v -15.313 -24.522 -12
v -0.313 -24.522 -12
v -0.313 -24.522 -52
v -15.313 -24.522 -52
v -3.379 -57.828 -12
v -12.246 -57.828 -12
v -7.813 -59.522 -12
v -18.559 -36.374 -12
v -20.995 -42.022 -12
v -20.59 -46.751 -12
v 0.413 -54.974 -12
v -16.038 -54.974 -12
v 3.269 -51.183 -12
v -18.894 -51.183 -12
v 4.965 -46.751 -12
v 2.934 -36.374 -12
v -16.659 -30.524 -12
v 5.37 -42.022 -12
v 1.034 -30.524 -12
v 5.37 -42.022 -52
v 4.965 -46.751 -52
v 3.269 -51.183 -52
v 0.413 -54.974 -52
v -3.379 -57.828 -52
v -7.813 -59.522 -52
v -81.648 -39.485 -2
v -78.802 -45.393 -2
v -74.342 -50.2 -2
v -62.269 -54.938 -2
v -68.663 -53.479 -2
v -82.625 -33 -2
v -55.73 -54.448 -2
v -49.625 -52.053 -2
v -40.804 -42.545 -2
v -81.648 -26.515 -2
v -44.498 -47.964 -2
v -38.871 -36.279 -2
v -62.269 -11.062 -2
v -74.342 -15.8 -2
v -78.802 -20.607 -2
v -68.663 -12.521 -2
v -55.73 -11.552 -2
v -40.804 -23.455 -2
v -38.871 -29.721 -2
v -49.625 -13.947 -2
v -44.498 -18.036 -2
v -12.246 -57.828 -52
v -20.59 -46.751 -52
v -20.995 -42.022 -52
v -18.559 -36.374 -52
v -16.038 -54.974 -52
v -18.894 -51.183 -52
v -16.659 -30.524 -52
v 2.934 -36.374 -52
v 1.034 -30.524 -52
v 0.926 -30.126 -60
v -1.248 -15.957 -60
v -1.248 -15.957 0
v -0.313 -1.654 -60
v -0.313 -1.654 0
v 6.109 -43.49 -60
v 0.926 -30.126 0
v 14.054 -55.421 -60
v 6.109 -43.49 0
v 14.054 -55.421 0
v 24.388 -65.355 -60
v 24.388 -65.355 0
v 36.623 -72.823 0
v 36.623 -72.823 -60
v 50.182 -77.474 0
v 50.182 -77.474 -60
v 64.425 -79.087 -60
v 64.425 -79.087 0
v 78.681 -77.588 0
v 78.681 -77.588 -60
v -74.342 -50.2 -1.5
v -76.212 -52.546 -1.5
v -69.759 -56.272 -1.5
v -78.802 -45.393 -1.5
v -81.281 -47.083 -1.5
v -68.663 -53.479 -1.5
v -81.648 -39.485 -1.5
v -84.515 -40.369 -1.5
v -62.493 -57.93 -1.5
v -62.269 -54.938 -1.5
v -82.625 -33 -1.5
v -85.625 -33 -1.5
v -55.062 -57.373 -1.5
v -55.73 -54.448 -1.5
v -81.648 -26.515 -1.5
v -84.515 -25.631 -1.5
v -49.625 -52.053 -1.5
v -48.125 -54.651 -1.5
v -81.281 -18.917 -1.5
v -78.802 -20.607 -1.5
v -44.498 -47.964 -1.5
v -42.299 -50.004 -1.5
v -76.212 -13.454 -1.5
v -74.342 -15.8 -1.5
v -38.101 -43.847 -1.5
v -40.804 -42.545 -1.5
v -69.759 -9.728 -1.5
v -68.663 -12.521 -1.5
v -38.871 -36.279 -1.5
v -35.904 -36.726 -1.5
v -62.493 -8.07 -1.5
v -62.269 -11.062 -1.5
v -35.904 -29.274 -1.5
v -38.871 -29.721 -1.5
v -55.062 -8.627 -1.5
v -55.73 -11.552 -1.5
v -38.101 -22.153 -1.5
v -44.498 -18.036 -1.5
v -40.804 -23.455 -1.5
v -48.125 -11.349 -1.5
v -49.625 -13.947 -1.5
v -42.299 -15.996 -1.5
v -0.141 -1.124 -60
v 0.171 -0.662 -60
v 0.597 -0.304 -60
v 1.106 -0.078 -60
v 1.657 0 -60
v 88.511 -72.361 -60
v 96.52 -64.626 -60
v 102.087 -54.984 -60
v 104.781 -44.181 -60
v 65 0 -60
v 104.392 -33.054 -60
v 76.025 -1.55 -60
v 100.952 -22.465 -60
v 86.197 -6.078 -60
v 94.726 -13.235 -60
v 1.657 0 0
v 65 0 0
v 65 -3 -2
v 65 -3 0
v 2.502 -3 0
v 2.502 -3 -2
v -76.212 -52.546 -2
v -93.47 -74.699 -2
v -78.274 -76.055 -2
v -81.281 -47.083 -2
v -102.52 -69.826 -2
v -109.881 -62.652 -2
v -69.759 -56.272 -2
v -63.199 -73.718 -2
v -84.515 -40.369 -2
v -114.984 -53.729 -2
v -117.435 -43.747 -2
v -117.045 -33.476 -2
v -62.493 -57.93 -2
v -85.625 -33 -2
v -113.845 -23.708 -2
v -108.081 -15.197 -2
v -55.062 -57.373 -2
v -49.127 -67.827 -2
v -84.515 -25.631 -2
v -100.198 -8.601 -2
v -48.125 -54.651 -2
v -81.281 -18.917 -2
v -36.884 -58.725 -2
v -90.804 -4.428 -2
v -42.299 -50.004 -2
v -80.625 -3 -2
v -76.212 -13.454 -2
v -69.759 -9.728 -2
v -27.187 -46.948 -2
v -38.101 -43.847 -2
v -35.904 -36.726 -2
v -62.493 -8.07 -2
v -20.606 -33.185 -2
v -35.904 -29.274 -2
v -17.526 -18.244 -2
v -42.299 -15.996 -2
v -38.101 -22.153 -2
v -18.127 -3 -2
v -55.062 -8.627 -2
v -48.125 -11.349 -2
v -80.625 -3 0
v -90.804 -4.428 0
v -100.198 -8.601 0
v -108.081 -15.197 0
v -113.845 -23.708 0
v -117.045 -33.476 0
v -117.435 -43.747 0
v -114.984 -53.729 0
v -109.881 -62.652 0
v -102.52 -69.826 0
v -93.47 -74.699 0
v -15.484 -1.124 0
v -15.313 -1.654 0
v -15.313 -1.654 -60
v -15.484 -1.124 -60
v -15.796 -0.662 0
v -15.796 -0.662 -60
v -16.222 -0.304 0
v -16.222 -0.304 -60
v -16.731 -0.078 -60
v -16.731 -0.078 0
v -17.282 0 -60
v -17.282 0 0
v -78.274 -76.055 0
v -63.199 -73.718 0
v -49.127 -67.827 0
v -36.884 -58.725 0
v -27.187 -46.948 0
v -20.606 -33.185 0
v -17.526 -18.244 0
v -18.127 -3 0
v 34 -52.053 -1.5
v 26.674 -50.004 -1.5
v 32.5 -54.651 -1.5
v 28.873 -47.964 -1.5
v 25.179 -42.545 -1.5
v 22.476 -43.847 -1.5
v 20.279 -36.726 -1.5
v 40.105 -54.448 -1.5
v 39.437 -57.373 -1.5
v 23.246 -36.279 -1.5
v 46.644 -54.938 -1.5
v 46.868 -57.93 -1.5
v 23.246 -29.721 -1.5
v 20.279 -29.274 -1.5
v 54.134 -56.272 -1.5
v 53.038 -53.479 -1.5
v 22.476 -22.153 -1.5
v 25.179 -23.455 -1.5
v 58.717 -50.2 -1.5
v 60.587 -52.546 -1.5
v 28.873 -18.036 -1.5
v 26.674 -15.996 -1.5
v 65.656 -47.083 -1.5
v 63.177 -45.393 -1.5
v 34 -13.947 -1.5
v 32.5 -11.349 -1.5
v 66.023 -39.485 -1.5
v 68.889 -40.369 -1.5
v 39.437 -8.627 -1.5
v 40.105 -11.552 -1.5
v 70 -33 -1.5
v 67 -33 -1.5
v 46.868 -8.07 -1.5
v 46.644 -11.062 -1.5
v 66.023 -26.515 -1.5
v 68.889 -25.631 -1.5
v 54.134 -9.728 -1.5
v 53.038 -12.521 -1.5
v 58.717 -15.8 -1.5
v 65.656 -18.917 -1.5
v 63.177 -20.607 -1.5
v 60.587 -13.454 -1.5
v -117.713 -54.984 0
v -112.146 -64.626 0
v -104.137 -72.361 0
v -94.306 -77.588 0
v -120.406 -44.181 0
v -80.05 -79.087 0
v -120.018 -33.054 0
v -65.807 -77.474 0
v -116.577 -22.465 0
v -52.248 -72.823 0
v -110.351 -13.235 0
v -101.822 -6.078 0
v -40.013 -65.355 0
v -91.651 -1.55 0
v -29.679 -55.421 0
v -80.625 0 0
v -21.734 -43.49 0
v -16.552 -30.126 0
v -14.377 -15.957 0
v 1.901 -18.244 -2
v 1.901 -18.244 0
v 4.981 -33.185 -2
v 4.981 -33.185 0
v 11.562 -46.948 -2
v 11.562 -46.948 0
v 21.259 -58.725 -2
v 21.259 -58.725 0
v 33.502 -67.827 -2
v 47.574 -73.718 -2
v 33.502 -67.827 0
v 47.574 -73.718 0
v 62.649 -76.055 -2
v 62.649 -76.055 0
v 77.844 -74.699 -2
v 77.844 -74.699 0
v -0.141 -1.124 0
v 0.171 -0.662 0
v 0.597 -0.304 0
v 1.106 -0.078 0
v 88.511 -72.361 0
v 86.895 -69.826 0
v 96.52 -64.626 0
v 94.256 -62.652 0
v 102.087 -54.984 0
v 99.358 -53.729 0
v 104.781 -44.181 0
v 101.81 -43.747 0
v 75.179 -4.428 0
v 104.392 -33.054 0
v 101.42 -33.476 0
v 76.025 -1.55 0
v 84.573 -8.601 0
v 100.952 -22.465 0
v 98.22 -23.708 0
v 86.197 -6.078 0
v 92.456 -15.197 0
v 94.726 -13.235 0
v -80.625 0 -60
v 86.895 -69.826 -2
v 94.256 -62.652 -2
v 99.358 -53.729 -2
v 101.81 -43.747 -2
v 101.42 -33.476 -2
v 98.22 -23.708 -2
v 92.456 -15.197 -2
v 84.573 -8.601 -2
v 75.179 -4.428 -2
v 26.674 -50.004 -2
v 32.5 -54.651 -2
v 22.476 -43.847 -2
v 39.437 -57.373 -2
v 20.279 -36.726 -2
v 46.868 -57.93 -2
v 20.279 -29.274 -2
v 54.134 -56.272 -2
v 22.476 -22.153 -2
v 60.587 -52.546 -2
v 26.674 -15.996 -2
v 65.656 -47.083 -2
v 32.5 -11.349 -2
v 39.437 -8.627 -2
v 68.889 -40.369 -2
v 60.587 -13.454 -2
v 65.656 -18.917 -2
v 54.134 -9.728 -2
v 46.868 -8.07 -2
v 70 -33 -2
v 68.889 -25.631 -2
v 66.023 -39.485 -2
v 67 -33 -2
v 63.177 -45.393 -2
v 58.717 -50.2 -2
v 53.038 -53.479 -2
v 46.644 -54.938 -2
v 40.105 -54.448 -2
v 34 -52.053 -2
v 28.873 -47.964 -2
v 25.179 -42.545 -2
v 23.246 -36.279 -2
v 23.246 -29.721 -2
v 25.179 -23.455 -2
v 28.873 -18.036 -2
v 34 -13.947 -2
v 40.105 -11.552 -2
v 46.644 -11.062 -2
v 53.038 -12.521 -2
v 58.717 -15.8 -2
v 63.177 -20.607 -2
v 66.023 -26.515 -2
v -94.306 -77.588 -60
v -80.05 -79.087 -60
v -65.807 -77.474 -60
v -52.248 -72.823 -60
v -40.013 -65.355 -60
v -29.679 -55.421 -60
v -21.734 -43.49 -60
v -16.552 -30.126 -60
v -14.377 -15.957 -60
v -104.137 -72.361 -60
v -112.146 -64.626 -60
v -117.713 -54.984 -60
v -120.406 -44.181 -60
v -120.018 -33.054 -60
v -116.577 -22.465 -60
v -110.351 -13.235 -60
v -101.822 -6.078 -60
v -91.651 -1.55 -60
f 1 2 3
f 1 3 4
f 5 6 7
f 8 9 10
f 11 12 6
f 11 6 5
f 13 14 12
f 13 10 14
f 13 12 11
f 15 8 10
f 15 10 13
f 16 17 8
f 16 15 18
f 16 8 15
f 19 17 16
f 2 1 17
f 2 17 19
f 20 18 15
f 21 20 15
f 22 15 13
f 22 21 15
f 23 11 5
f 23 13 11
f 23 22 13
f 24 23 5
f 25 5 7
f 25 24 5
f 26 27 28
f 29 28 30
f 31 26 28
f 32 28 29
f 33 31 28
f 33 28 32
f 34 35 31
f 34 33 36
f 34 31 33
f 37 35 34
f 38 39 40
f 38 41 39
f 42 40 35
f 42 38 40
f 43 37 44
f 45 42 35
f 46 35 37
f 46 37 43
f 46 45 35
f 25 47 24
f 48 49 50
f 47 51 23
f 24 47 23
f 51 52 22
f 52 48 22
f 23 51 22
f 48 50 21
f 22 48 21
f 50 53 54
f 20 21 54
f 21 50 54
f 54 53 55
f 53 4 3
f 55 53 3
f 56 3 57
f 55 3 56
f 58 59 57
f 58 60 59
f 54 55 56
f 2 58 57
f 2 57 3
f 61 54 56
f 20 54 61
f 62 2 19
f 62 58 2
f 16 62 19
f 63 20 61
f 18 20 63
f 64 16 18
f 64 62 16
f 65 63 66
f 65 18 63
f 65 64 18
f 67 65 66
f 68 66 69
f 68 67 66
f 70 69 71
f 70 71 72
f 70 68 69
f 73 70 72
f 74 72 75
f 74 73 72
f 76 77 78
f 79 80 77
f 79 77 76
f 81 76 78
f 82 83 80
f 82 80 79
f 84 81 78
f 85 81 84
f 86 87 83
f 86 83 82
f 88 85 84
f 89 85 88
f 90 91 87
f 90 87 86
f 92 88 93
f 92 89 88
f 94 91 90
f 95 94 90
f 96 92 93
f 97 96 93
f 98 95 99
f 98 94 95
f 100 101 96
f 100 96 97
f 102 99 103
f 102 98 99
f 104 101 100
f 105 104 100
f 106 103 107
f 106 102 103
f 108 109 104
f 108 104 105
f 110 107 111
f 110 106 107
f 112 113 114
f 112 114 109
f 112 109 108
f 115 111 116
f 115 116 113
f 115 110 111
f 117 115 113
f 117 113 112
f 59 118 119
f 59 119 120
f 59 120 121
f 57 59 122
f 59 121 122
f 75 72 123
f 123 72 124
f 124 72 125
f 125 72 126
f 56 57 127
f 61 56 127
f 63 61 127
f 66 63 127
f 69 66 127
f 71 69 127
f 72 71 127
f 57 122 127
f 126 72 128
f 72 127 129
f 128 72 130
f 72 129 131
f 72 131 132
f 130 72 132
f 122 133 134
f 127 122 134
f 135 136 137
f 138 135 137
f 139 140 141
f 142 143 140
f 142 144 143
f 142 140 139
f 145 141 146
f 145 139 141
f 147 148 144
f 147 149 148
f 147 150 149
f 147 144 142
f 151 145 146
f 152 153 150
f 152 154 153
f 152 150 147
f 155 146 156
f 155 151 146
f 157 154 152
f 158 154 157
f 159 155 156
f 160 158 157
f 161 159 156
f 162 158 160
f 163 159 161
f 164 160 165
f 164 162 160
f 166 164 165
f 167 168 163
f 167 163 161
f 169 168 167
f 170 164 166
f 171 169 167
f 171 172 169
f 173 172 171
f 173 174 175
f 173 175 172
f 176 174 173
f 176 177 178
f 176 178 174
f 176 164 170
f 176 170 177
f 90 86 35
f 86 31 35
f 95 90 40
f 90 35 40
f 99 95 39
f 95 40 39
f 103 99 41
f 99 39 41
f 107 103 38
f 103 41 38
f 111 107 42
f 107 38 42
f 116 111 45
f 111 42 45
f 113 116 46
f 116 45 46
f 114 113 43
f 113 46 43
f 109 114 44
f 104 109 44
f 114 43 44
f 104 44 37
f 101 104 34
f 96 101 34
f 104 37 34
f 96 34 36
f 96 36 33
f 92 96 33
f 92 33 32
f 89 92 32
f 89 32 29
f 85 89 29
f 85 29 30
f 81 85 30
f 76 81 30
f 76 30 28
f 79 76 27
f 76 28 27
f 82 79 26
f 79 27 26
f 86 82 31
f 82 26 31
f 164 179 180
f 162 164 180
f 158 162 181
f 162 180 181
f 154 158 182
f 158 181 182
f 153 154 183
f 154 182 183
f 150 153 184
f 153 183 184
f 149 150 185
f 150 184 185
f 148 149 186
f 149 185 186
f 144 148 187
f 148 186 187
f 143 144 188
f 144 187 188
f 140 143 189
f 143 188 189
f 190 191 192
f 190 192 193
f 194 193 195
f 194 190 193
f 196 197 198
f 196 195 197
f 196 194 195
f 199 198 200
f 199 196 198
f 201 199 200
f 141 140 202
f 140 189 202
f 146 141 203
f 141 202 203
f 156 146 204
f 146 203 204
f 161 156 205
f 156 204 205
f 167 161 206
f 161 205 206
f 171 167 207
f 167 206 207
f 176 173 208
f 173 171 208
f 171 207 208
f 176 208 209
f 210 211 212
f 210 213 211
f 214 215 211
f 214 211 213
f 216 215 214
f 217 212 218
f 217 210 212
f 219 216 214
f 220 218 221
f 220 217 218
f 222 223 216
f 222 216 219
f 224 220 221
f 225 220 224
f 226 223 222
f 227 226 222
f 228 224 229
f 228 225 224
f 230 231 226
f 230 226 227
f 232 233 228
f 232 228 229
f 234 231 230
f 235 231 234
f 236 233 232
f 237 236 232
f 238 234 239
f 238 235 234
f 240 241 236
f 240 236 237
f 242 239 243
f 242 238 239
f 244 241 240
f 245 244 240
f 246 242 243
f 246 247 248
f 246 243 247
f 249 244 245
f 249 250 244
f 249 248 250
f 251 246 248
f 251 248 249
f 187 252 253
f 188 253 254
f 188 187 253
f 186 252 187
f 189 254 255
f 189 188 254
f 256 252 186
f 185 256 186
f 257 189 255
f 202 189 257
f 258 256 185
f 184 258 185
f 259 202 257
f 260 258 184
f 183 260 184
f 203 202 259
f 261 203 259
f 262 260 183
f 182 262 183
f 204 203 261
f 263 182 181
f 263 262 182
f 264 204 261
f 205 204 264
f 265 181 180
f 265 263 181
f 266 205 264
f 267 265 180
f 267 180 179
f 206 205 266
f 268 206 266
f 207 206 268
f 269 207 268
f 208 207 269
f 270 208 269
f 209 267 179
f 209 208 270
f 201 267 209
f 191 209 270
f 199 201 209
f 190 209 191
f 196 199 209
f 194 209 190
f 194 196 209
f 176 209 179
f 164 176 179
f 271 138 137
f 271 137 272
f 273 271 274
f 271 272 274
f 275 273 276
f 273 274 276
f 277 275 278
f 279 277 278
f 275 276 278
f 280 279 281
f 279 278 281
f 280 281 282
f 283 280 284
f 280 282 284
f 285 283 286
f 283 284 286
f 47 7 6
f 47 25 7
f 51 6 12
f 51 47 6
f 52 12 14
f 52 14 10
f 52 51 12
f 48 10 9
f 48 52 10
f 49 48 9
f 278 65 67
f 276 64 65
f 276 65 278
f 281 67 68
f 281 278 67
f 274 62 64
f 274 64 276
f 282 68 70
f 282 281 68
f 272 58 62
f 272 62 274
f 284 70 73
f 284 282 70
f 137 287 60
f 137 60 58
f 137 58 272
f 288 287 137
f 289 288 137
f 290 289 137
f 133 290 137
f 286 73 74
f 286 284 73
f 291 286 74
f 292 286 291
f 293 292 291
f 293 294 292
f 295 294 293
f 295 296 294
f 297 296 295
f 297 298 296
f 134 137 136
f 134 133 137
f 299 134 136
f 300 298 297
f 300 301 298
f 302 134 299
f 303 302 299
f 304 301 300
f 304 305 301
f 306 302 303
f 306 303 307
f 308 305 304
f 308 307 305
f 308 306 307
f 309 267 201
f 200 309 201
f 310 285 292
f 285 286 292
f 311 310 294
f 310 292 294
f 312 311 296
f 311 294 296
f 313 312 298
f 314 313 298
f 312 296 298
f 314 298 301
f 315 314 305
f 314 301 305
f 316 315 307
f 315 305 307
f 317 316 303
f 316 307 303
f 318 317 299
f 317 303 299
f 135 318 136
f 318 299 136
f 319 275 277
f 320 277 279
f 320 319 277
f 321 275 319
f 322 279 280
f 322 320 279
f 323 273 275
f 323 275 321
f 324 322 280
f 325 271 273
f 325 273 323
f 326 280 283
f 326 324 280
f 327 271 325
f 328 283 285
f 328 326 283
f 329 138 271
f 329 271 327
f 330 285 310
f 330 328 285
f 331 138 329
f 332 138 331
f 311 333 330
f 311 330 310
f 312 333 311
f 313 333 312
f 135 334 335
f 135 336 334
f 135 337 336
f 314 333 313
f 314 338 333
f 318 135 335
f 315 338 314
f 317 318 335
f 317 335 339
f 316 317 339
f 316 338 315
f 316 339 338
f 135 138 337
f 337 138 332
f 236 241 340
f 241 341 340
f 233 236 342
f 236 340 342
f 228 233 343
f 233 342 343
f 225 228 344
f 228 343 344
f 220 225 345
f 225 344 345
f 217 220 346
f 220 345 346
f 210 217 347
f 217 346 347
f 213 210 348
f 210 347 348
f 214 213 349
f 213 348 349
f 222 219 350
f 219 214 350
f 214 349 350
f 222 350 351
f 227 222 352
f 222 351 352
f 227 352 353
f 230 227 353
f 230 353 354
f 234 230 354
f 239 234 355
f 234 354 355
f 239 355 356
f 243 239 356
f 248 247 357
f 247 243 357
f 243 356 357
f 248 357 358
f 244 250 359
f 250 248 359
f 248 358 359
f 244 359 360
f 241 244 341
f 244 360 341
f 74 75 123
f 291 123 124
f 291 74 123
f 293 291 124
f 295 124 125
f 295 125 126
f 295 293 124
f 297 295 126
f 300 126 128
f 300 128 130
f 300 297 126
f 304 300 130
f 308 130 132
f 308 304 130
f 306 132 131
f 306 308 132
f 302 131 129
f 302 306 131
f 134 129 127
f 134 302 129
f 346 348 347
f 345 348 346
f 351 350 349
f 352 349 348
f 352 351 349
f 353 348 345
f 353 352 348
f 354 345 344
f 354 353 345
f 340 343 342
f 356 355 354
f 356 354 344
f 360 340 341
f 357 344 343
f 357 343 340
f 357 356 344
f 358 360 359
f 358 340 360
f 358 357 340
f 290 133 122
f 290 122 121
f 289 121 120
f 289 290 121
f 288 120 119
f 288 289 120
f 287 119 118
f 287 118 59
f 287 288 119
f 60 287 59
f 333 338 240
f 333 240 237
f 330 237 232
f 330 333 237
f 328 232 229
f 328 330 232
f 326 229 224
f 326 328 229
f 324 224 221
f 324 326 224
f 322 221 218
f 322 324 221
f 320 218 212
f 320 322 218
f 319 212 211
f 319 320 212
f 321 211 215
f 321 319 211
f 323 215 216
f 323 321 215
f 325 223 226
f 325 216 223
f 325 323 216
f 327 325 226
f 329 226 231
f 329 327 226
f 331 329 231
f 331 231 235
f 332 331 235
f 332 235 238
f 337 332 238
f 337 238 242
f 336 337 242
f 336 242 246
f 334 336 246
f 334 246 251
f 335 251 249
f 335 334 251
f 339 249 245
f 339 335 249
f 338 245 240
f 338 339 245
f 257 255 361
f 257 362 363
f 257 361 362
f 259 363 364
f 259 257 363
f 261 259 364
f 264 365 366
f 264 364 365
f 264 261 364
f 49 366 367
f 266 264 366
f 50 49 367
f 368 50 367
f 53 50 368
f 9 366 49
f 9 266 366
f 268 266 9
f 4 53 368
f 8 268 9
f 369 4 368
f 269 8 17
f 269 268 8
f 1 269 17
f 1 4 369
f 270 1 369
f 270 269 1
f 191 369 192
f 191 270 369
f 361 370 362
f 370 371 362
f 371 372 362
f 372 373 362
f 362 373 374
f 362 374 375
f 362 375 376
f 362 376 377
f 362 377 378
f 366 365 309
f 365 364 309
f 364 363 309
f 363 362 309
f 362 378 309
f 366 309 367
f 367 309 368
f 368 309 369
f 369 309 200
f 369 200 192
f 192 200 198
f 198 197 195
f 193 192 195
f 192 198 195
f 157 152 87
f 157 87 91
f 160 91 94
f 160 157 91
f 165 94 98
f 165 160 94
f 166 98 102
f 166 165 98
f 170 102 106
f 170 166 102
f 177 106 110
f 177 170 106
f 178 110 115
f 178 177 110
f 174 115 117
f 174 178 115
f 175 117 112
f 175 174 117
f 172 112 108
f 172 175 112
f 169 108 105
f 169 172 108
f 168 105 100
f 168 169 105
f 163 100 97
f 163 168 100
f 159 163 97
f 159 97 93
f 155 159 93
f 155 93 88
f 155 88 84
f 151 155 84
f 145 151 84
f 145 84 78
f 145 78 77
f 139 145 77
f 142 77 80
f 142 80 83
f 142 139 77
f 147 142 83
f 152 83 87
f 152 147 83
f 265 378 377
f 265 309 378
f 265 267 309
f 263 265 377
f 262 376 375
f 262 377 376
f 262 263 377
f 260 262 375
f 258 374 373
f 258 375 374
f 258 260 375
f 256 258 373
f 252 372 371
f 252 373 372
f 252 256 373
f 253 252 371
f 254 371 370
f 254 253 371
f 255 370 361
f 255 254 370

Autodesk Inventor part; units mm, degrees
ref_plane "YZ Plane" through (0, 0, 0) normal (1, 0, 0) x (0, 1, 0)
ref_plane "XZ Plane" through (0, 0, 0) normal (0, 1, 0) x (-1, 0, 0)
sketch "Sketch1" plane through (0, 0, 0) normal (0, 0, 1) x (1, 0, 0)
  line L0 (1.6571, 0) -> (65, 0)
  arc A0 (78.6808, -77.5877) -> (65, 0) centre (65, -40) ccw
  line L1 (65, -40) -> (78.6808, -77.5877) construction
  line L2 (65, -40) -> (65, 0) construction
  arc A1 (-0.3126, -1.6535) -> (78.6808, -77.5877) centre (64.6893, -13.0878) ccw
  arc A2 (1.6571, 0) -> (-0.3126, -1.6535) centre (1.6571, -2) ccw
  line L3 (65, -3) -> (2.5022, -3)
  arc A3 (2.5022, -3) -> (77.8443, -74.699) centre (64.6893, -13.0878) ccw
  arc A4 (77.8443, -74.699) -> (65, -3) centre (65, -40) ccw
  point P0 (0, 0)
  dimension "d4" = 65
  dimension "d5" = 160
  dimension "d6" = 66
  dimension "d8" = 2
  dimension "d11" = 3
extrude "Extrusion1" add sketch "Sketch1" against normal blind 60 contours L0 A0 A1 A2 | A4 A3 L3
extrude "Extrusion2" cut sketch "Sketch1" against normal blind 2 contours A4 A3 L3
sketch "Sketch3" plane through (0, 0, -2) normal (0, 0, 1) x (1, 0, 0)
  circle A0 centre (45, -33) radius 25
  circle A1 centre (45, -33) radius 22
  point P0 (0, 0)
  dimension "d14" = 50
  dimension "d15" = 3
extrude "Extrusion3" add sketch "Sketch3" along normal blind 0.5
ref_plane "Work Plane1" through (0, 0, -32) normal (0, 0, 1) x (1, 0, 0)
sketch "Sketch4" plane through (0, 0, -32) normal (0, 0, 1) x (1, 0, 0)
  arc A0 (-0.3126, -1.6535) -> (78.6808, -77.5877) centre (64.6893, -13.0878) ccw projected
  line L0 (-0.3126, -24.5221) -> (-7.8126, -24.5221)
  line L1 (-7.8126, -24.5221) -> (-7.8126, -59.5221)
  arc A1 (-7.8126, -59.5221) -> (5.3698, -42.0221) centre (-11.6048, -42.9504) ccw
  point P0 (0, 0)
  dimension "d19" = 7.5
  dimension "d20" = 35
  dimension "d21" = 17
extrude "Extrusion4" add sketch "Sketch4" along normal mid plane 40
mirror "Mirror1" about plane through (-7.8126, -24.5221, -32) normal (-1, 0, 0)
properties part number "Project eyes"
